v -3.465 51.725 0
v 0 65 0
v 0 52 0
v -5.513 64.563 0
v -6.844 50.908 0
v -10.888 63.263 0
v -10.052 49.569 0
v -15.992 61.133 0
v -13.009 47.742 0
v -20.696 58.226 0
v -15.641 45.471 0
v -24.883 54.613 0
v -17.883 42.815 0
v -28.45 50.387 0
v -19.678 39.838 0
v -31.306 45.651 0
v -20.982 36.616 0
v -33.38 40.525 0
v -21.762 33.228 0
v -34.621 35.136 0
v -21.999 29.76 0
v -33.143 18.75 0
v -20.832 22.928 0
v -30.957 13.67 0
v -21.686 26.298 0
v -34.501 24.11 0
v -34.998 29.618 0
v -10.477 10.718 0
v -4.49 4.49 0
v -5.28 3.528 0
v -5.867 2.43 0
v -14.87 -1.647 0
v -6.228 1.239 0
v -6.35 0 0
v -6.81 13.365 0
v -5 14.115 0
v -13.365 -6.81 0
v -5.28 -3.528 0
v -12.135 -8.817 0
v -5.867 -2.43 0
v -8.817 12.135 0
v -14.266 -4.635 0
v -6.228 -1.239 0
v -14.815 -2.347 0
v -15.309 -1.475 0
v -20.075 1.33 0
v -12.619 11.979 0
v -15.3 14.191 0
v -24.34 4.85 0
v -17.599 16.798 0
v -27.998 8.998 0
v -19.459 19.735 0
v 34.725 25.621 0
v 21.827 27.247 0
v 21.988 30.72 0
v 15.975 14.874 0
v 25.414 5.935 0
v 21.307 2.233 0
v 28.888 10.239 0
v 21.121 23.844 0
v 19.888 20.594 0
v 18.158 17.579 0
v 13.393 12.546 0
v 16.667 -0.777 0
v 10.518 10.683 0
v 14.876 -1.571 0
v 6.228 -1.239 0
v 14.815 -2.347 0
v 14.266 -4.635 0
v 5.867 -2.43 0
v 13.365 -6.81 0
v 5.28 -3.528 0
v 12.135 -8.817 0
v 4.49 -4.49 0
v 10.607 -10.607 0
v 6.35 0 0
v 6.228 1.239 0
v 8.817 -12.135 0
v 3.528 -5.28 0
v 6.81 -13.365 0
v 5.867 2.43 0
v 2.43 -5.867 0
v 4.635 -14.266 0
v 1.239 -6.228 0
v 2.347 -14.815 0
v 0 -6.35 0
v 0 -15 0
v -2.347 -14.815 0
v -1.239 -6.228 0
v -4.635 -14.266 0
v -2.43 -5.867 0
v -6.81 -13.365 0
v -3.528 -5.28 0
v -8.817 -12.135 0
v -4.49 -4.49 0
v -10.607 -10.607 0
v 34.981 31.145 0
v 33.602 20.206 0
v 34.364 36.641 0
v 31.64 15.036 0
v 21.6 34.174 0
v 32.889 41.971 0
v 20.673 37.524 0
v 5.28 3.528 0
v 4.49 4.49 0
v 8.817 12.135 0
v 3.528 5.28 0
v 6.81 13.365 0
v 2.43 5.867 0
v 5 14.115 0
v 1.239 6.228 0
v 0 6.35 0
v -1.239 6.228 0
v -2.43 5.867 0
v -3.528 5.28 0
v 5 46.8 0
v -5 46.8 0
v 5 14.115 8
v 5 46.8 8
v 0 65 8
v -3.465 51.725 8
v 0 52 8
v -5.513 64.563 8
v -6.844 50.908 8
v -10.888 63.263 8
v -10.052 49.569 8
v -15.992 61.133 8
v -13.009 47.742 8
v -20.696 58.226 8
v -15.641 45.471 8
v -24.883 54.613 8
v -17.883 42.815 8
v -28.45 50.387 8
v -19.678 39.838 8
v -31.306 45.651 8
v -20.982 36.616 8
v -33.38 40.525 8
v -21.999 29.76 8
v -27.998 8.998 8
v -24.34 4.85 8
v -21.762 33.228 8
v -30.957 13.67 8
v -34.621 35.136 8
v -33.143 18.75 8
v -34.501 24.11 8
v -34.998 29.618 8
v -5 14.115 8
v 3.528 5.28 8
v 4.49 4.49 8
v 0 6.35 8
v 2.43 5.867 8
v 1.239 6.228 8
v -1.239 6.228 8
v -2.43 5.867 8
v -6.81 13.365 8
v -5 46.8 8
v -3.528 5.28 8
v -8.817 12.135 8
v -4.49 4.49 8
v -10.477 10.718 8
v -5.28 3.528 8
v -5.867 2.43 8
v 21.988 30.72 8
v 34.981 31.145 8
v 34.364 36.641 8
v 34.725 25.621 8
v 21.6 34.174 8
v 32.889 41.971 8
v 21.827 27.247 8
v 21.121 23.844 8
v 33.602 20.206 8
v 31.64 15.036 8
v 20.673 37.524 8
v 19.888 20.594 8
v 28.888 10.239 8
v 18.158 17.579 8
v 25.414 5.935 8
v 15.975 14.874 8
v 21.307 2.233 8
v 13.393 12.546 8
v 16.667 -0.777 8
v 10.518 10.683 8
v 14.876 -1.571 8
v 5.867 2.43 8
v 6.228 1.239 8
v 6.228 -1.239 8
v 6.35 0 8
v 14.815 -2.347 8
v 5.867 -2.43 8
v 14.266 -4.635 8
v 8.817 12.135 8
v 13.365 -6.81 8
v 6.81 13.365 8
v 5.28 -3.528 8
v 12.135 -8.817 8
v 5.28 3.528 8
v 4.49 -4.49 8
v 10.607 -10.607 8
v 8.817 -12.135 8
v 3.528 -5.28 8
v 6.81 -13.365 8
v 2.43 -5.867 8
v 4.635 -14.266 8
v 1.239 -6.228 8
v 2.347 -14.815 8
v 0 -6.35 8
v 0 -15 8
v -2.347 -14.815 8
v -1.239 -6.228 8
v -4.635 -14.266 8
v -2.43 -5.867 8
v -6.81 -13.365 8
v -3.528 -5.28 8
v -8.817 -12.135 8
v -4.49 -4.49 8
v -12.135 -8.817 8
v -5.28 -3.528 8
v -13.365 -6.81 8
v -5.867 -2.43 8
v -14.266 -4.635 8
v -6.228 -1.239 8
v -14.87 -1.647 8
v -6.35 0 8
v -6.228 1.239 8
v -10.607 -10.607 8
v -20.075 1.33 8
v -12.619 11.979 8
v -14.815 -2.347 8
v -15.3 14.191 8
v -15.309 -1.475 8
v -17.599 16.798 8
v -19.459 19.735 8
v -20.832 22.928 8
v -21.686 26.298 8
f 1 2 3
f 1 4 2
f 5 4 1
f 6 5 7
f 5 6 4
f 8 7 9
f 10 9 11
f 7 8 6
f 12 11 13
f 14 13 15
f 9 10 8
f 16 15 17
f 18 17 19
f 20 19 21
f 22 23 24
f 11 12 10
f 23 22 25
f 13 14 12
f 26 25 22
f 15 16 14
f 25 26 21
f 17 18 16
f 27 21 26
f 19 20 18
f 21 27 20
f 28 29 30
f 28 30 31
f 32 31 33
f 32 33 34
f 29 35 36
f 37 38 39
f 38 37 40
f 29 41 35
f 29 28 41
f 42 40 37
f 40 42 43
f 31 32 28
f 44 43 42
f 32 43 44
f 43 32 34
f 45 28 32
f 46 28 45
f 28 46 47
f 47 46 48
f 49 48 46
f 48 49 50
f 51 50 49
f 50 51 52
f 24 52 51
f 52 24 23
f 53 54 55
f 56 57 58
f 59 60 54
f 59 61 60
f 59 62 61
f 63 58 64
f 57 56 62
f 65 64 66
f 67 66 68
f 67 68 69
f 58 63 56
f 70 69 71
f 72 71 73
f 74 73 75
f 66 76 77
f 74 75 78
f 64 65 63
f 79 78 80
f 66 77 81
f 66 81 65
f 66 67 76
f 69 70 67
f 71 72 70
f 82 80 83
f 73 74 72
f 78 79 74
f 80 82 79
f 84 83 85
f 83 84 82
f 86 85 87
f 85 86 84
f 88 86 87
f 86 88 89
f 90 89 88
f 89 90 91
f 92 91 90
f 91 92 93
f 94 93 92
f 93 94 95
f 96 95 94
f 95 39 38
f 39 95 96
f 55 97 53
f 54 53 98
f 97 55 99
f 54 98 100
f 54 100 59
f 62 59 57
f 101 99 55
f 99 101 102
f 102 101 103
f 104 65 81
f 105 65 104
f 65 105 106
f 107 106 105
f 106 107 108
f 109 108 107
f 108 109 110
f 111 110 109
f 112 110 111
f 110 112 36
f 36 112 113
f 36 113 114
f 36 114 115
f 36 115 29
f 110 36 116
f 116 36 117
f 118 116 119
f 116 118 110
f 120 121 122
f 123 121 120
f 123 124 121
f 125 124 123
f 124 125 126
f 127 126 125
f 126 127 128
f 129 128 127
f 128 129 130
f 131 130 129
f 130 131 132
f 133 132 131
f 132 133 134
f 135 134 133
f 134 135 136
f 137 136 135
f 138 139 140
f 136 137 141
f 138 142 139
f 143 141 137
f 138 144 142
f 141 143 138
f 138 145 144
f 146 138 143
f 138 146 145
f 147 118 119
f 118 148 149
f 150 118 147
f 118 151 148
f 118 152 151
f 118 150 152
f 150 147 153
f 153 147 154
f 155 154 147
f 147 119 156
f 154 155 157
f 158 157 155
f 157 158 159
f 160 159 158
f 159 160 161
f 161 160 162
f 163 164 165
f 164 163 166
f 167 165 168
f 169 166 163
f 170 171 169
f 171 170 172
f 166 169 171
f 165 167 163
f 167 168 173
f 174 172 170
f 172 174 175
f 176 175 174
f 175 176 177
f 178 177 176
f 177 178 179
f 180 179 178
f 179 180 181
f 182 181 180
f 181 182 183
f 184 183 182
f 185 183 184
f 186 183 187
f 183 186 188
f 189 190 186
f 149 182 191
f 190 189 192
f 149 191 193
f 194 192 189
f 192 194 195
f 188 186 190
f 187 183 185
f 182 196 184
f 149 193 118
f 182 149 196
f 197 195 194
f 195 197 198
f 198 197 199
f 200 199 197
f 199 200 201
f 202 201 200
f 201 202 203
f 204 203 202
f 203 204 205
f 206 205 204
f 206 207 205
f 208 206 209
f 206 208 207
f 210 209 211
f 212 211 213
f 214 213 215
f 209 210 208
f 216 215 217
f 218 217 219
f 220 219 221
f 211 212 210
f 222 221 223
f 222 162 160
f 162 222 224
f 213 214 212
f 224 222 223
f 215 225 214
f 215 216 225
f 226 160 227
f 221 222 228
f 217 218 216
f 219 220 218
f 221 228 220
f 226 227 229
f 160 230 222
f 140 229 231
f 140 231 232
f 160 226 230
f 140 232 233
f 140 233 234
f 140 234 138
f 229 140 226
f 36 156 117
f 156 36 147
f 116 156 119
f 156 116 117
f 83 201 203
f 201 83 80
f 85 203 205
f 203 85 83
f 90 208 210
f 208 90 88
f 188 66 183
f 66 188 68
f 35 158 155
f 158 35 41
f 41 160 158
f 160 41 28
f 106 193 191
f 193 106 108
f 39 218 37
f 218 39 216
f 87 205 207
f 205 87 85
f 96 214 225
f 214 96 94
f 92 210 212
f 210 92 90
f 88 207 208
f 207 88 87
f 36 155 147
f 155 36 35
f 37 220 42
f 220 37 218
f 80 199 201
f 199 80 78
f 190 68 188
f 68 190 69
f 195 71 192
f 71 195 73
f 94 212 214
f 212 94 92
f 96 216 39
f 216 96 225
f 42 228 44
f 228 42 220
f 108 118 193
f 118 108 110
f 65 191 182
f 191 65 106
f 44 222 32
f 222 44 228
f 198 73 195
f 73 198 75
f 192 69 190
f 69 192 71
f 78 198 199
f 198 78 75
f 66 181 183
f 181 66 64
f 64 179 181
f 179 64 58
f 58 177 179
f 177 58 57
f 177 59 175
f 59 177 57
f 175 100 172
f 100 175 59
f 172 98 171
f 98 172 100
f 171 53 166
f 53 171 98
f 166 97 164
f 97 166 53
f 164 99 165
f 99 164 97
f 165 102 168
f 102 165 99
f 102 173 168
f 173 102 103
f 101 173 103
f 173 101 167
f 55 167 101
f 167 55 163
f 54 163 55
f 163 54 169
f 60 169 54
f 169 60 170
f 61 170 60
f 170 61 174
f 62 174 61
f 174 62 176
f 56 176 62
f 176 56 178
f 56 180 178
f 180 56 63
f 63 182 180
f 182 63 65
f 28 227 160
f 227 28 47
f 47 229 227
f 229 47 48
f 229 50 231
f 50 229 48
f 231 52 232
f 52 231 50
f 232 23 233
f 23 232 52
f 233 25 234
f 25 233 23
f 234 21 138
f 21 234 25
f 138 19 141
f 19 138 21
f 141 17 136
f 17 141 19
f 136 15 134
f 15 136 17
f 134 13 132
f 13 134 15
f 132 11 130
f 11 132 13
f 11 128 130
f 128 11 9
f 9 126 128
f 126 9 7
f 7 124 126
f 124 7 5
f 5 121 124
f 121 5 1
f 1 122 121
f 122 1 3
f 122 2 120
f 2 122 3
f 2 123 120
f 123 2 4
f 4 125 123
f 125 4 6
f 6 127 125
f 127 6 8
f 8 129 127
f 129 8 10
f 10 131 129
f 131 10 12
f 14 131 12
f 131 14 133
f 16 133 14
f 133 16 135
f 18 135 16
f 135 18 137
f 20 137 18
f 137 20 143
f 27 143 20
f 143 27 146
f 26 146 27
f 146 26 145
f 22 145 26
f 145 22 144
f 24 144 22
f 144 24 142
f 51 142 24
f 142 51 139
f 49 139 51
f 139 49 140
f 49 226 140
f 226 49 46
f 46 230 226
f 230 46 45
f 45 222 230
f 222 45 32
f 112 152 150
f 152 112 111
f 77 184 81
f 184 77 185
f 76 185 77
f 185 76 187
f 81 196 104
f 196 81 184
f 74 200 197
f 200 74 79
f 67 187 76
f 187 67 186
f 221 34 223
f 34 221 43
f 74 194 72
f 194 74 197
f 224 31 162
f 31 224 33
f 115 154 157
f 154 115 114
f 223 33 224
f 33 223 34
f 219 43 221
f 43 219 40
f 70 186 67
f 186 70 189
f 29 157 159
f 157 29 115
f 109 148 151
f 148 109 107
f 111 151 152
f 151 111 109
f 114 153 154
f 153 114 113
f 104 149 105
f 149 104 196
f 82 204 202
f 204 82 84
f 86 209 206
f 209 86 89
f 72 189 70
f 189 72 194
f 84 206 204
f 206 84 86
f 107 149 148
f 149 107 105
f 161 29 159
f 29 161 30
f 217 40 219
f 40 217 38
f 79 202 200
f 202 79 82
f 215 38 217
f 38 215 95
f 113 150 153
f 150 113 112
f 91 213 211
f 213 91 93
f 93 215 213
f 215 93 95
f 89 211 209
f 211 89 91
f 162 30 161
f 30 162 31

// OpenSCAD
$fn = 32;

// ----------------------------------------------------------------------
// Hook: 60 mm shank into a 22 mm curl, 8 mm thick
// ----------------------------------------------------------------------

// --- parameters (mm) ---
shank_len = 60;           // shank length from the boss centre
shank_w = 10;             // shank width
boss_d = 30;              // boss diameter
bore_d = 12.7;            // boss bore
curl_in = 22;             // curl inner radius
curl_out = 35;            // curl outer radius
curl_sweep = 290;         // curl sweep angle
hook_t = 8;               // hook thickness

shank_profile = [[-5, 46.8], [5, 46.8], [5, 13], [-5, 13]];
boss_profile = [[15, 0], [14.815, 2.347], [14.266, 4.635], [13.365, 6.81], [12.135, 8.817], [10.607, 10.607], [8.817, 12.135], [6.81, 13.365], [4.635, 14.266], [2.347, 14.815], [0, 15], [-2.347, 14.815], [-4.635, 14.266], [-6.81, 13.365], [-8.817, 12.135], [-10.607, 10.607], [-12.135, 8.817], [-13.365, 6.81], [-14.266, 4.635], [-14.815, 2.347], [-15, 0], [-14.815, -2.347], [-14.266, -4.635], [-13.365, -6.81], [-12.135, -8.817], [-10.607, -10.607], [-8.817, -12.135], [-6.81, -13.365], [-4.635, -14.266], [-2.347, -14.815], [0, -15], [2.347, -14.815], [4.635, -14.266], [6.81, -13.365], [8.817, -12.135], [10.607, -10.607], [12.135, -8.817], [13.365, -6.81], [14.266, -4.635], [14.815, -2.347]];
curl_profile = [[0, 65], [-5.513, 64.563], [-10.888, 63.263], [-15.992, 61.133], [-20.696, 58.226], [-24.883, 54.613], [-28.45, 50.387], [-31.306, 45.651], [-33.38, 40.525], [-34.621, 35.136], [-34.998, 29.618], [-34.501, 24.11], [-33.143, 18.75], [-30.957, 13.67], [-27.998, 8.998], [-24.34, 4.85], [-20.075, 1.33], [-15.309, -1.475], [-10.16, -3.493], [-4.758, -4.675], [0.764, -4.992], [6.266, -4.435], [11.611, -3.018], [16.667, -0.777], [21.307, 2.233], [25.414, 5.935], [28.888, 10.239], [31.64, 15.036], [33.602, 20.206], [34.725, 25.621], [34.981, 31.145], [34.364, 36.641], [32.889, 41.971], [20.673, 37.524], [21.6, 34.174], [21.988, 30.72], [21.827, 27.247], [21.121, 23.844], [19.888, 20.594], [18.158, 17.579], [15.975, 14.874], [13.393, 12.546], [10.476, 10.655], [7.298, 9.246], [3.938, 8.355], [0.48, 8.005], [-2.99, 8.204], [-6.386, 8.947], [-9.623, 10.216], [-12.619, 11.979], [-15.3, 14.191], [-17.599, 16.798], [-19.459, 19.735], [-20.832, 22.928], [-21.686, 26.298], [-21.999, 29.76], [-21.762, 33.228], [-20.982, 36.616], [-19.678, 39.838], [-17.883, 42.815], [-15.641, 45.471], [-13.009, 47.742], [-10.052, 49.569], [-6.844, 50.908], [-3.465, 51.725], [0, 52]];

difference() {
  union() {
    /* three overlapping outlines: shank, boss and the smooth curl */
    linear_extrude(height = hook_t) polygon(shank_profile);
    linear_extrude(height = hook_t) polygon(boss_profile);
    linear_extrude(height = hook_t) polygon(curl_profile);
  }
  translate([0, 0, -2.5]) cylinder(h = hook_t + 5, d = bore_d);
}
